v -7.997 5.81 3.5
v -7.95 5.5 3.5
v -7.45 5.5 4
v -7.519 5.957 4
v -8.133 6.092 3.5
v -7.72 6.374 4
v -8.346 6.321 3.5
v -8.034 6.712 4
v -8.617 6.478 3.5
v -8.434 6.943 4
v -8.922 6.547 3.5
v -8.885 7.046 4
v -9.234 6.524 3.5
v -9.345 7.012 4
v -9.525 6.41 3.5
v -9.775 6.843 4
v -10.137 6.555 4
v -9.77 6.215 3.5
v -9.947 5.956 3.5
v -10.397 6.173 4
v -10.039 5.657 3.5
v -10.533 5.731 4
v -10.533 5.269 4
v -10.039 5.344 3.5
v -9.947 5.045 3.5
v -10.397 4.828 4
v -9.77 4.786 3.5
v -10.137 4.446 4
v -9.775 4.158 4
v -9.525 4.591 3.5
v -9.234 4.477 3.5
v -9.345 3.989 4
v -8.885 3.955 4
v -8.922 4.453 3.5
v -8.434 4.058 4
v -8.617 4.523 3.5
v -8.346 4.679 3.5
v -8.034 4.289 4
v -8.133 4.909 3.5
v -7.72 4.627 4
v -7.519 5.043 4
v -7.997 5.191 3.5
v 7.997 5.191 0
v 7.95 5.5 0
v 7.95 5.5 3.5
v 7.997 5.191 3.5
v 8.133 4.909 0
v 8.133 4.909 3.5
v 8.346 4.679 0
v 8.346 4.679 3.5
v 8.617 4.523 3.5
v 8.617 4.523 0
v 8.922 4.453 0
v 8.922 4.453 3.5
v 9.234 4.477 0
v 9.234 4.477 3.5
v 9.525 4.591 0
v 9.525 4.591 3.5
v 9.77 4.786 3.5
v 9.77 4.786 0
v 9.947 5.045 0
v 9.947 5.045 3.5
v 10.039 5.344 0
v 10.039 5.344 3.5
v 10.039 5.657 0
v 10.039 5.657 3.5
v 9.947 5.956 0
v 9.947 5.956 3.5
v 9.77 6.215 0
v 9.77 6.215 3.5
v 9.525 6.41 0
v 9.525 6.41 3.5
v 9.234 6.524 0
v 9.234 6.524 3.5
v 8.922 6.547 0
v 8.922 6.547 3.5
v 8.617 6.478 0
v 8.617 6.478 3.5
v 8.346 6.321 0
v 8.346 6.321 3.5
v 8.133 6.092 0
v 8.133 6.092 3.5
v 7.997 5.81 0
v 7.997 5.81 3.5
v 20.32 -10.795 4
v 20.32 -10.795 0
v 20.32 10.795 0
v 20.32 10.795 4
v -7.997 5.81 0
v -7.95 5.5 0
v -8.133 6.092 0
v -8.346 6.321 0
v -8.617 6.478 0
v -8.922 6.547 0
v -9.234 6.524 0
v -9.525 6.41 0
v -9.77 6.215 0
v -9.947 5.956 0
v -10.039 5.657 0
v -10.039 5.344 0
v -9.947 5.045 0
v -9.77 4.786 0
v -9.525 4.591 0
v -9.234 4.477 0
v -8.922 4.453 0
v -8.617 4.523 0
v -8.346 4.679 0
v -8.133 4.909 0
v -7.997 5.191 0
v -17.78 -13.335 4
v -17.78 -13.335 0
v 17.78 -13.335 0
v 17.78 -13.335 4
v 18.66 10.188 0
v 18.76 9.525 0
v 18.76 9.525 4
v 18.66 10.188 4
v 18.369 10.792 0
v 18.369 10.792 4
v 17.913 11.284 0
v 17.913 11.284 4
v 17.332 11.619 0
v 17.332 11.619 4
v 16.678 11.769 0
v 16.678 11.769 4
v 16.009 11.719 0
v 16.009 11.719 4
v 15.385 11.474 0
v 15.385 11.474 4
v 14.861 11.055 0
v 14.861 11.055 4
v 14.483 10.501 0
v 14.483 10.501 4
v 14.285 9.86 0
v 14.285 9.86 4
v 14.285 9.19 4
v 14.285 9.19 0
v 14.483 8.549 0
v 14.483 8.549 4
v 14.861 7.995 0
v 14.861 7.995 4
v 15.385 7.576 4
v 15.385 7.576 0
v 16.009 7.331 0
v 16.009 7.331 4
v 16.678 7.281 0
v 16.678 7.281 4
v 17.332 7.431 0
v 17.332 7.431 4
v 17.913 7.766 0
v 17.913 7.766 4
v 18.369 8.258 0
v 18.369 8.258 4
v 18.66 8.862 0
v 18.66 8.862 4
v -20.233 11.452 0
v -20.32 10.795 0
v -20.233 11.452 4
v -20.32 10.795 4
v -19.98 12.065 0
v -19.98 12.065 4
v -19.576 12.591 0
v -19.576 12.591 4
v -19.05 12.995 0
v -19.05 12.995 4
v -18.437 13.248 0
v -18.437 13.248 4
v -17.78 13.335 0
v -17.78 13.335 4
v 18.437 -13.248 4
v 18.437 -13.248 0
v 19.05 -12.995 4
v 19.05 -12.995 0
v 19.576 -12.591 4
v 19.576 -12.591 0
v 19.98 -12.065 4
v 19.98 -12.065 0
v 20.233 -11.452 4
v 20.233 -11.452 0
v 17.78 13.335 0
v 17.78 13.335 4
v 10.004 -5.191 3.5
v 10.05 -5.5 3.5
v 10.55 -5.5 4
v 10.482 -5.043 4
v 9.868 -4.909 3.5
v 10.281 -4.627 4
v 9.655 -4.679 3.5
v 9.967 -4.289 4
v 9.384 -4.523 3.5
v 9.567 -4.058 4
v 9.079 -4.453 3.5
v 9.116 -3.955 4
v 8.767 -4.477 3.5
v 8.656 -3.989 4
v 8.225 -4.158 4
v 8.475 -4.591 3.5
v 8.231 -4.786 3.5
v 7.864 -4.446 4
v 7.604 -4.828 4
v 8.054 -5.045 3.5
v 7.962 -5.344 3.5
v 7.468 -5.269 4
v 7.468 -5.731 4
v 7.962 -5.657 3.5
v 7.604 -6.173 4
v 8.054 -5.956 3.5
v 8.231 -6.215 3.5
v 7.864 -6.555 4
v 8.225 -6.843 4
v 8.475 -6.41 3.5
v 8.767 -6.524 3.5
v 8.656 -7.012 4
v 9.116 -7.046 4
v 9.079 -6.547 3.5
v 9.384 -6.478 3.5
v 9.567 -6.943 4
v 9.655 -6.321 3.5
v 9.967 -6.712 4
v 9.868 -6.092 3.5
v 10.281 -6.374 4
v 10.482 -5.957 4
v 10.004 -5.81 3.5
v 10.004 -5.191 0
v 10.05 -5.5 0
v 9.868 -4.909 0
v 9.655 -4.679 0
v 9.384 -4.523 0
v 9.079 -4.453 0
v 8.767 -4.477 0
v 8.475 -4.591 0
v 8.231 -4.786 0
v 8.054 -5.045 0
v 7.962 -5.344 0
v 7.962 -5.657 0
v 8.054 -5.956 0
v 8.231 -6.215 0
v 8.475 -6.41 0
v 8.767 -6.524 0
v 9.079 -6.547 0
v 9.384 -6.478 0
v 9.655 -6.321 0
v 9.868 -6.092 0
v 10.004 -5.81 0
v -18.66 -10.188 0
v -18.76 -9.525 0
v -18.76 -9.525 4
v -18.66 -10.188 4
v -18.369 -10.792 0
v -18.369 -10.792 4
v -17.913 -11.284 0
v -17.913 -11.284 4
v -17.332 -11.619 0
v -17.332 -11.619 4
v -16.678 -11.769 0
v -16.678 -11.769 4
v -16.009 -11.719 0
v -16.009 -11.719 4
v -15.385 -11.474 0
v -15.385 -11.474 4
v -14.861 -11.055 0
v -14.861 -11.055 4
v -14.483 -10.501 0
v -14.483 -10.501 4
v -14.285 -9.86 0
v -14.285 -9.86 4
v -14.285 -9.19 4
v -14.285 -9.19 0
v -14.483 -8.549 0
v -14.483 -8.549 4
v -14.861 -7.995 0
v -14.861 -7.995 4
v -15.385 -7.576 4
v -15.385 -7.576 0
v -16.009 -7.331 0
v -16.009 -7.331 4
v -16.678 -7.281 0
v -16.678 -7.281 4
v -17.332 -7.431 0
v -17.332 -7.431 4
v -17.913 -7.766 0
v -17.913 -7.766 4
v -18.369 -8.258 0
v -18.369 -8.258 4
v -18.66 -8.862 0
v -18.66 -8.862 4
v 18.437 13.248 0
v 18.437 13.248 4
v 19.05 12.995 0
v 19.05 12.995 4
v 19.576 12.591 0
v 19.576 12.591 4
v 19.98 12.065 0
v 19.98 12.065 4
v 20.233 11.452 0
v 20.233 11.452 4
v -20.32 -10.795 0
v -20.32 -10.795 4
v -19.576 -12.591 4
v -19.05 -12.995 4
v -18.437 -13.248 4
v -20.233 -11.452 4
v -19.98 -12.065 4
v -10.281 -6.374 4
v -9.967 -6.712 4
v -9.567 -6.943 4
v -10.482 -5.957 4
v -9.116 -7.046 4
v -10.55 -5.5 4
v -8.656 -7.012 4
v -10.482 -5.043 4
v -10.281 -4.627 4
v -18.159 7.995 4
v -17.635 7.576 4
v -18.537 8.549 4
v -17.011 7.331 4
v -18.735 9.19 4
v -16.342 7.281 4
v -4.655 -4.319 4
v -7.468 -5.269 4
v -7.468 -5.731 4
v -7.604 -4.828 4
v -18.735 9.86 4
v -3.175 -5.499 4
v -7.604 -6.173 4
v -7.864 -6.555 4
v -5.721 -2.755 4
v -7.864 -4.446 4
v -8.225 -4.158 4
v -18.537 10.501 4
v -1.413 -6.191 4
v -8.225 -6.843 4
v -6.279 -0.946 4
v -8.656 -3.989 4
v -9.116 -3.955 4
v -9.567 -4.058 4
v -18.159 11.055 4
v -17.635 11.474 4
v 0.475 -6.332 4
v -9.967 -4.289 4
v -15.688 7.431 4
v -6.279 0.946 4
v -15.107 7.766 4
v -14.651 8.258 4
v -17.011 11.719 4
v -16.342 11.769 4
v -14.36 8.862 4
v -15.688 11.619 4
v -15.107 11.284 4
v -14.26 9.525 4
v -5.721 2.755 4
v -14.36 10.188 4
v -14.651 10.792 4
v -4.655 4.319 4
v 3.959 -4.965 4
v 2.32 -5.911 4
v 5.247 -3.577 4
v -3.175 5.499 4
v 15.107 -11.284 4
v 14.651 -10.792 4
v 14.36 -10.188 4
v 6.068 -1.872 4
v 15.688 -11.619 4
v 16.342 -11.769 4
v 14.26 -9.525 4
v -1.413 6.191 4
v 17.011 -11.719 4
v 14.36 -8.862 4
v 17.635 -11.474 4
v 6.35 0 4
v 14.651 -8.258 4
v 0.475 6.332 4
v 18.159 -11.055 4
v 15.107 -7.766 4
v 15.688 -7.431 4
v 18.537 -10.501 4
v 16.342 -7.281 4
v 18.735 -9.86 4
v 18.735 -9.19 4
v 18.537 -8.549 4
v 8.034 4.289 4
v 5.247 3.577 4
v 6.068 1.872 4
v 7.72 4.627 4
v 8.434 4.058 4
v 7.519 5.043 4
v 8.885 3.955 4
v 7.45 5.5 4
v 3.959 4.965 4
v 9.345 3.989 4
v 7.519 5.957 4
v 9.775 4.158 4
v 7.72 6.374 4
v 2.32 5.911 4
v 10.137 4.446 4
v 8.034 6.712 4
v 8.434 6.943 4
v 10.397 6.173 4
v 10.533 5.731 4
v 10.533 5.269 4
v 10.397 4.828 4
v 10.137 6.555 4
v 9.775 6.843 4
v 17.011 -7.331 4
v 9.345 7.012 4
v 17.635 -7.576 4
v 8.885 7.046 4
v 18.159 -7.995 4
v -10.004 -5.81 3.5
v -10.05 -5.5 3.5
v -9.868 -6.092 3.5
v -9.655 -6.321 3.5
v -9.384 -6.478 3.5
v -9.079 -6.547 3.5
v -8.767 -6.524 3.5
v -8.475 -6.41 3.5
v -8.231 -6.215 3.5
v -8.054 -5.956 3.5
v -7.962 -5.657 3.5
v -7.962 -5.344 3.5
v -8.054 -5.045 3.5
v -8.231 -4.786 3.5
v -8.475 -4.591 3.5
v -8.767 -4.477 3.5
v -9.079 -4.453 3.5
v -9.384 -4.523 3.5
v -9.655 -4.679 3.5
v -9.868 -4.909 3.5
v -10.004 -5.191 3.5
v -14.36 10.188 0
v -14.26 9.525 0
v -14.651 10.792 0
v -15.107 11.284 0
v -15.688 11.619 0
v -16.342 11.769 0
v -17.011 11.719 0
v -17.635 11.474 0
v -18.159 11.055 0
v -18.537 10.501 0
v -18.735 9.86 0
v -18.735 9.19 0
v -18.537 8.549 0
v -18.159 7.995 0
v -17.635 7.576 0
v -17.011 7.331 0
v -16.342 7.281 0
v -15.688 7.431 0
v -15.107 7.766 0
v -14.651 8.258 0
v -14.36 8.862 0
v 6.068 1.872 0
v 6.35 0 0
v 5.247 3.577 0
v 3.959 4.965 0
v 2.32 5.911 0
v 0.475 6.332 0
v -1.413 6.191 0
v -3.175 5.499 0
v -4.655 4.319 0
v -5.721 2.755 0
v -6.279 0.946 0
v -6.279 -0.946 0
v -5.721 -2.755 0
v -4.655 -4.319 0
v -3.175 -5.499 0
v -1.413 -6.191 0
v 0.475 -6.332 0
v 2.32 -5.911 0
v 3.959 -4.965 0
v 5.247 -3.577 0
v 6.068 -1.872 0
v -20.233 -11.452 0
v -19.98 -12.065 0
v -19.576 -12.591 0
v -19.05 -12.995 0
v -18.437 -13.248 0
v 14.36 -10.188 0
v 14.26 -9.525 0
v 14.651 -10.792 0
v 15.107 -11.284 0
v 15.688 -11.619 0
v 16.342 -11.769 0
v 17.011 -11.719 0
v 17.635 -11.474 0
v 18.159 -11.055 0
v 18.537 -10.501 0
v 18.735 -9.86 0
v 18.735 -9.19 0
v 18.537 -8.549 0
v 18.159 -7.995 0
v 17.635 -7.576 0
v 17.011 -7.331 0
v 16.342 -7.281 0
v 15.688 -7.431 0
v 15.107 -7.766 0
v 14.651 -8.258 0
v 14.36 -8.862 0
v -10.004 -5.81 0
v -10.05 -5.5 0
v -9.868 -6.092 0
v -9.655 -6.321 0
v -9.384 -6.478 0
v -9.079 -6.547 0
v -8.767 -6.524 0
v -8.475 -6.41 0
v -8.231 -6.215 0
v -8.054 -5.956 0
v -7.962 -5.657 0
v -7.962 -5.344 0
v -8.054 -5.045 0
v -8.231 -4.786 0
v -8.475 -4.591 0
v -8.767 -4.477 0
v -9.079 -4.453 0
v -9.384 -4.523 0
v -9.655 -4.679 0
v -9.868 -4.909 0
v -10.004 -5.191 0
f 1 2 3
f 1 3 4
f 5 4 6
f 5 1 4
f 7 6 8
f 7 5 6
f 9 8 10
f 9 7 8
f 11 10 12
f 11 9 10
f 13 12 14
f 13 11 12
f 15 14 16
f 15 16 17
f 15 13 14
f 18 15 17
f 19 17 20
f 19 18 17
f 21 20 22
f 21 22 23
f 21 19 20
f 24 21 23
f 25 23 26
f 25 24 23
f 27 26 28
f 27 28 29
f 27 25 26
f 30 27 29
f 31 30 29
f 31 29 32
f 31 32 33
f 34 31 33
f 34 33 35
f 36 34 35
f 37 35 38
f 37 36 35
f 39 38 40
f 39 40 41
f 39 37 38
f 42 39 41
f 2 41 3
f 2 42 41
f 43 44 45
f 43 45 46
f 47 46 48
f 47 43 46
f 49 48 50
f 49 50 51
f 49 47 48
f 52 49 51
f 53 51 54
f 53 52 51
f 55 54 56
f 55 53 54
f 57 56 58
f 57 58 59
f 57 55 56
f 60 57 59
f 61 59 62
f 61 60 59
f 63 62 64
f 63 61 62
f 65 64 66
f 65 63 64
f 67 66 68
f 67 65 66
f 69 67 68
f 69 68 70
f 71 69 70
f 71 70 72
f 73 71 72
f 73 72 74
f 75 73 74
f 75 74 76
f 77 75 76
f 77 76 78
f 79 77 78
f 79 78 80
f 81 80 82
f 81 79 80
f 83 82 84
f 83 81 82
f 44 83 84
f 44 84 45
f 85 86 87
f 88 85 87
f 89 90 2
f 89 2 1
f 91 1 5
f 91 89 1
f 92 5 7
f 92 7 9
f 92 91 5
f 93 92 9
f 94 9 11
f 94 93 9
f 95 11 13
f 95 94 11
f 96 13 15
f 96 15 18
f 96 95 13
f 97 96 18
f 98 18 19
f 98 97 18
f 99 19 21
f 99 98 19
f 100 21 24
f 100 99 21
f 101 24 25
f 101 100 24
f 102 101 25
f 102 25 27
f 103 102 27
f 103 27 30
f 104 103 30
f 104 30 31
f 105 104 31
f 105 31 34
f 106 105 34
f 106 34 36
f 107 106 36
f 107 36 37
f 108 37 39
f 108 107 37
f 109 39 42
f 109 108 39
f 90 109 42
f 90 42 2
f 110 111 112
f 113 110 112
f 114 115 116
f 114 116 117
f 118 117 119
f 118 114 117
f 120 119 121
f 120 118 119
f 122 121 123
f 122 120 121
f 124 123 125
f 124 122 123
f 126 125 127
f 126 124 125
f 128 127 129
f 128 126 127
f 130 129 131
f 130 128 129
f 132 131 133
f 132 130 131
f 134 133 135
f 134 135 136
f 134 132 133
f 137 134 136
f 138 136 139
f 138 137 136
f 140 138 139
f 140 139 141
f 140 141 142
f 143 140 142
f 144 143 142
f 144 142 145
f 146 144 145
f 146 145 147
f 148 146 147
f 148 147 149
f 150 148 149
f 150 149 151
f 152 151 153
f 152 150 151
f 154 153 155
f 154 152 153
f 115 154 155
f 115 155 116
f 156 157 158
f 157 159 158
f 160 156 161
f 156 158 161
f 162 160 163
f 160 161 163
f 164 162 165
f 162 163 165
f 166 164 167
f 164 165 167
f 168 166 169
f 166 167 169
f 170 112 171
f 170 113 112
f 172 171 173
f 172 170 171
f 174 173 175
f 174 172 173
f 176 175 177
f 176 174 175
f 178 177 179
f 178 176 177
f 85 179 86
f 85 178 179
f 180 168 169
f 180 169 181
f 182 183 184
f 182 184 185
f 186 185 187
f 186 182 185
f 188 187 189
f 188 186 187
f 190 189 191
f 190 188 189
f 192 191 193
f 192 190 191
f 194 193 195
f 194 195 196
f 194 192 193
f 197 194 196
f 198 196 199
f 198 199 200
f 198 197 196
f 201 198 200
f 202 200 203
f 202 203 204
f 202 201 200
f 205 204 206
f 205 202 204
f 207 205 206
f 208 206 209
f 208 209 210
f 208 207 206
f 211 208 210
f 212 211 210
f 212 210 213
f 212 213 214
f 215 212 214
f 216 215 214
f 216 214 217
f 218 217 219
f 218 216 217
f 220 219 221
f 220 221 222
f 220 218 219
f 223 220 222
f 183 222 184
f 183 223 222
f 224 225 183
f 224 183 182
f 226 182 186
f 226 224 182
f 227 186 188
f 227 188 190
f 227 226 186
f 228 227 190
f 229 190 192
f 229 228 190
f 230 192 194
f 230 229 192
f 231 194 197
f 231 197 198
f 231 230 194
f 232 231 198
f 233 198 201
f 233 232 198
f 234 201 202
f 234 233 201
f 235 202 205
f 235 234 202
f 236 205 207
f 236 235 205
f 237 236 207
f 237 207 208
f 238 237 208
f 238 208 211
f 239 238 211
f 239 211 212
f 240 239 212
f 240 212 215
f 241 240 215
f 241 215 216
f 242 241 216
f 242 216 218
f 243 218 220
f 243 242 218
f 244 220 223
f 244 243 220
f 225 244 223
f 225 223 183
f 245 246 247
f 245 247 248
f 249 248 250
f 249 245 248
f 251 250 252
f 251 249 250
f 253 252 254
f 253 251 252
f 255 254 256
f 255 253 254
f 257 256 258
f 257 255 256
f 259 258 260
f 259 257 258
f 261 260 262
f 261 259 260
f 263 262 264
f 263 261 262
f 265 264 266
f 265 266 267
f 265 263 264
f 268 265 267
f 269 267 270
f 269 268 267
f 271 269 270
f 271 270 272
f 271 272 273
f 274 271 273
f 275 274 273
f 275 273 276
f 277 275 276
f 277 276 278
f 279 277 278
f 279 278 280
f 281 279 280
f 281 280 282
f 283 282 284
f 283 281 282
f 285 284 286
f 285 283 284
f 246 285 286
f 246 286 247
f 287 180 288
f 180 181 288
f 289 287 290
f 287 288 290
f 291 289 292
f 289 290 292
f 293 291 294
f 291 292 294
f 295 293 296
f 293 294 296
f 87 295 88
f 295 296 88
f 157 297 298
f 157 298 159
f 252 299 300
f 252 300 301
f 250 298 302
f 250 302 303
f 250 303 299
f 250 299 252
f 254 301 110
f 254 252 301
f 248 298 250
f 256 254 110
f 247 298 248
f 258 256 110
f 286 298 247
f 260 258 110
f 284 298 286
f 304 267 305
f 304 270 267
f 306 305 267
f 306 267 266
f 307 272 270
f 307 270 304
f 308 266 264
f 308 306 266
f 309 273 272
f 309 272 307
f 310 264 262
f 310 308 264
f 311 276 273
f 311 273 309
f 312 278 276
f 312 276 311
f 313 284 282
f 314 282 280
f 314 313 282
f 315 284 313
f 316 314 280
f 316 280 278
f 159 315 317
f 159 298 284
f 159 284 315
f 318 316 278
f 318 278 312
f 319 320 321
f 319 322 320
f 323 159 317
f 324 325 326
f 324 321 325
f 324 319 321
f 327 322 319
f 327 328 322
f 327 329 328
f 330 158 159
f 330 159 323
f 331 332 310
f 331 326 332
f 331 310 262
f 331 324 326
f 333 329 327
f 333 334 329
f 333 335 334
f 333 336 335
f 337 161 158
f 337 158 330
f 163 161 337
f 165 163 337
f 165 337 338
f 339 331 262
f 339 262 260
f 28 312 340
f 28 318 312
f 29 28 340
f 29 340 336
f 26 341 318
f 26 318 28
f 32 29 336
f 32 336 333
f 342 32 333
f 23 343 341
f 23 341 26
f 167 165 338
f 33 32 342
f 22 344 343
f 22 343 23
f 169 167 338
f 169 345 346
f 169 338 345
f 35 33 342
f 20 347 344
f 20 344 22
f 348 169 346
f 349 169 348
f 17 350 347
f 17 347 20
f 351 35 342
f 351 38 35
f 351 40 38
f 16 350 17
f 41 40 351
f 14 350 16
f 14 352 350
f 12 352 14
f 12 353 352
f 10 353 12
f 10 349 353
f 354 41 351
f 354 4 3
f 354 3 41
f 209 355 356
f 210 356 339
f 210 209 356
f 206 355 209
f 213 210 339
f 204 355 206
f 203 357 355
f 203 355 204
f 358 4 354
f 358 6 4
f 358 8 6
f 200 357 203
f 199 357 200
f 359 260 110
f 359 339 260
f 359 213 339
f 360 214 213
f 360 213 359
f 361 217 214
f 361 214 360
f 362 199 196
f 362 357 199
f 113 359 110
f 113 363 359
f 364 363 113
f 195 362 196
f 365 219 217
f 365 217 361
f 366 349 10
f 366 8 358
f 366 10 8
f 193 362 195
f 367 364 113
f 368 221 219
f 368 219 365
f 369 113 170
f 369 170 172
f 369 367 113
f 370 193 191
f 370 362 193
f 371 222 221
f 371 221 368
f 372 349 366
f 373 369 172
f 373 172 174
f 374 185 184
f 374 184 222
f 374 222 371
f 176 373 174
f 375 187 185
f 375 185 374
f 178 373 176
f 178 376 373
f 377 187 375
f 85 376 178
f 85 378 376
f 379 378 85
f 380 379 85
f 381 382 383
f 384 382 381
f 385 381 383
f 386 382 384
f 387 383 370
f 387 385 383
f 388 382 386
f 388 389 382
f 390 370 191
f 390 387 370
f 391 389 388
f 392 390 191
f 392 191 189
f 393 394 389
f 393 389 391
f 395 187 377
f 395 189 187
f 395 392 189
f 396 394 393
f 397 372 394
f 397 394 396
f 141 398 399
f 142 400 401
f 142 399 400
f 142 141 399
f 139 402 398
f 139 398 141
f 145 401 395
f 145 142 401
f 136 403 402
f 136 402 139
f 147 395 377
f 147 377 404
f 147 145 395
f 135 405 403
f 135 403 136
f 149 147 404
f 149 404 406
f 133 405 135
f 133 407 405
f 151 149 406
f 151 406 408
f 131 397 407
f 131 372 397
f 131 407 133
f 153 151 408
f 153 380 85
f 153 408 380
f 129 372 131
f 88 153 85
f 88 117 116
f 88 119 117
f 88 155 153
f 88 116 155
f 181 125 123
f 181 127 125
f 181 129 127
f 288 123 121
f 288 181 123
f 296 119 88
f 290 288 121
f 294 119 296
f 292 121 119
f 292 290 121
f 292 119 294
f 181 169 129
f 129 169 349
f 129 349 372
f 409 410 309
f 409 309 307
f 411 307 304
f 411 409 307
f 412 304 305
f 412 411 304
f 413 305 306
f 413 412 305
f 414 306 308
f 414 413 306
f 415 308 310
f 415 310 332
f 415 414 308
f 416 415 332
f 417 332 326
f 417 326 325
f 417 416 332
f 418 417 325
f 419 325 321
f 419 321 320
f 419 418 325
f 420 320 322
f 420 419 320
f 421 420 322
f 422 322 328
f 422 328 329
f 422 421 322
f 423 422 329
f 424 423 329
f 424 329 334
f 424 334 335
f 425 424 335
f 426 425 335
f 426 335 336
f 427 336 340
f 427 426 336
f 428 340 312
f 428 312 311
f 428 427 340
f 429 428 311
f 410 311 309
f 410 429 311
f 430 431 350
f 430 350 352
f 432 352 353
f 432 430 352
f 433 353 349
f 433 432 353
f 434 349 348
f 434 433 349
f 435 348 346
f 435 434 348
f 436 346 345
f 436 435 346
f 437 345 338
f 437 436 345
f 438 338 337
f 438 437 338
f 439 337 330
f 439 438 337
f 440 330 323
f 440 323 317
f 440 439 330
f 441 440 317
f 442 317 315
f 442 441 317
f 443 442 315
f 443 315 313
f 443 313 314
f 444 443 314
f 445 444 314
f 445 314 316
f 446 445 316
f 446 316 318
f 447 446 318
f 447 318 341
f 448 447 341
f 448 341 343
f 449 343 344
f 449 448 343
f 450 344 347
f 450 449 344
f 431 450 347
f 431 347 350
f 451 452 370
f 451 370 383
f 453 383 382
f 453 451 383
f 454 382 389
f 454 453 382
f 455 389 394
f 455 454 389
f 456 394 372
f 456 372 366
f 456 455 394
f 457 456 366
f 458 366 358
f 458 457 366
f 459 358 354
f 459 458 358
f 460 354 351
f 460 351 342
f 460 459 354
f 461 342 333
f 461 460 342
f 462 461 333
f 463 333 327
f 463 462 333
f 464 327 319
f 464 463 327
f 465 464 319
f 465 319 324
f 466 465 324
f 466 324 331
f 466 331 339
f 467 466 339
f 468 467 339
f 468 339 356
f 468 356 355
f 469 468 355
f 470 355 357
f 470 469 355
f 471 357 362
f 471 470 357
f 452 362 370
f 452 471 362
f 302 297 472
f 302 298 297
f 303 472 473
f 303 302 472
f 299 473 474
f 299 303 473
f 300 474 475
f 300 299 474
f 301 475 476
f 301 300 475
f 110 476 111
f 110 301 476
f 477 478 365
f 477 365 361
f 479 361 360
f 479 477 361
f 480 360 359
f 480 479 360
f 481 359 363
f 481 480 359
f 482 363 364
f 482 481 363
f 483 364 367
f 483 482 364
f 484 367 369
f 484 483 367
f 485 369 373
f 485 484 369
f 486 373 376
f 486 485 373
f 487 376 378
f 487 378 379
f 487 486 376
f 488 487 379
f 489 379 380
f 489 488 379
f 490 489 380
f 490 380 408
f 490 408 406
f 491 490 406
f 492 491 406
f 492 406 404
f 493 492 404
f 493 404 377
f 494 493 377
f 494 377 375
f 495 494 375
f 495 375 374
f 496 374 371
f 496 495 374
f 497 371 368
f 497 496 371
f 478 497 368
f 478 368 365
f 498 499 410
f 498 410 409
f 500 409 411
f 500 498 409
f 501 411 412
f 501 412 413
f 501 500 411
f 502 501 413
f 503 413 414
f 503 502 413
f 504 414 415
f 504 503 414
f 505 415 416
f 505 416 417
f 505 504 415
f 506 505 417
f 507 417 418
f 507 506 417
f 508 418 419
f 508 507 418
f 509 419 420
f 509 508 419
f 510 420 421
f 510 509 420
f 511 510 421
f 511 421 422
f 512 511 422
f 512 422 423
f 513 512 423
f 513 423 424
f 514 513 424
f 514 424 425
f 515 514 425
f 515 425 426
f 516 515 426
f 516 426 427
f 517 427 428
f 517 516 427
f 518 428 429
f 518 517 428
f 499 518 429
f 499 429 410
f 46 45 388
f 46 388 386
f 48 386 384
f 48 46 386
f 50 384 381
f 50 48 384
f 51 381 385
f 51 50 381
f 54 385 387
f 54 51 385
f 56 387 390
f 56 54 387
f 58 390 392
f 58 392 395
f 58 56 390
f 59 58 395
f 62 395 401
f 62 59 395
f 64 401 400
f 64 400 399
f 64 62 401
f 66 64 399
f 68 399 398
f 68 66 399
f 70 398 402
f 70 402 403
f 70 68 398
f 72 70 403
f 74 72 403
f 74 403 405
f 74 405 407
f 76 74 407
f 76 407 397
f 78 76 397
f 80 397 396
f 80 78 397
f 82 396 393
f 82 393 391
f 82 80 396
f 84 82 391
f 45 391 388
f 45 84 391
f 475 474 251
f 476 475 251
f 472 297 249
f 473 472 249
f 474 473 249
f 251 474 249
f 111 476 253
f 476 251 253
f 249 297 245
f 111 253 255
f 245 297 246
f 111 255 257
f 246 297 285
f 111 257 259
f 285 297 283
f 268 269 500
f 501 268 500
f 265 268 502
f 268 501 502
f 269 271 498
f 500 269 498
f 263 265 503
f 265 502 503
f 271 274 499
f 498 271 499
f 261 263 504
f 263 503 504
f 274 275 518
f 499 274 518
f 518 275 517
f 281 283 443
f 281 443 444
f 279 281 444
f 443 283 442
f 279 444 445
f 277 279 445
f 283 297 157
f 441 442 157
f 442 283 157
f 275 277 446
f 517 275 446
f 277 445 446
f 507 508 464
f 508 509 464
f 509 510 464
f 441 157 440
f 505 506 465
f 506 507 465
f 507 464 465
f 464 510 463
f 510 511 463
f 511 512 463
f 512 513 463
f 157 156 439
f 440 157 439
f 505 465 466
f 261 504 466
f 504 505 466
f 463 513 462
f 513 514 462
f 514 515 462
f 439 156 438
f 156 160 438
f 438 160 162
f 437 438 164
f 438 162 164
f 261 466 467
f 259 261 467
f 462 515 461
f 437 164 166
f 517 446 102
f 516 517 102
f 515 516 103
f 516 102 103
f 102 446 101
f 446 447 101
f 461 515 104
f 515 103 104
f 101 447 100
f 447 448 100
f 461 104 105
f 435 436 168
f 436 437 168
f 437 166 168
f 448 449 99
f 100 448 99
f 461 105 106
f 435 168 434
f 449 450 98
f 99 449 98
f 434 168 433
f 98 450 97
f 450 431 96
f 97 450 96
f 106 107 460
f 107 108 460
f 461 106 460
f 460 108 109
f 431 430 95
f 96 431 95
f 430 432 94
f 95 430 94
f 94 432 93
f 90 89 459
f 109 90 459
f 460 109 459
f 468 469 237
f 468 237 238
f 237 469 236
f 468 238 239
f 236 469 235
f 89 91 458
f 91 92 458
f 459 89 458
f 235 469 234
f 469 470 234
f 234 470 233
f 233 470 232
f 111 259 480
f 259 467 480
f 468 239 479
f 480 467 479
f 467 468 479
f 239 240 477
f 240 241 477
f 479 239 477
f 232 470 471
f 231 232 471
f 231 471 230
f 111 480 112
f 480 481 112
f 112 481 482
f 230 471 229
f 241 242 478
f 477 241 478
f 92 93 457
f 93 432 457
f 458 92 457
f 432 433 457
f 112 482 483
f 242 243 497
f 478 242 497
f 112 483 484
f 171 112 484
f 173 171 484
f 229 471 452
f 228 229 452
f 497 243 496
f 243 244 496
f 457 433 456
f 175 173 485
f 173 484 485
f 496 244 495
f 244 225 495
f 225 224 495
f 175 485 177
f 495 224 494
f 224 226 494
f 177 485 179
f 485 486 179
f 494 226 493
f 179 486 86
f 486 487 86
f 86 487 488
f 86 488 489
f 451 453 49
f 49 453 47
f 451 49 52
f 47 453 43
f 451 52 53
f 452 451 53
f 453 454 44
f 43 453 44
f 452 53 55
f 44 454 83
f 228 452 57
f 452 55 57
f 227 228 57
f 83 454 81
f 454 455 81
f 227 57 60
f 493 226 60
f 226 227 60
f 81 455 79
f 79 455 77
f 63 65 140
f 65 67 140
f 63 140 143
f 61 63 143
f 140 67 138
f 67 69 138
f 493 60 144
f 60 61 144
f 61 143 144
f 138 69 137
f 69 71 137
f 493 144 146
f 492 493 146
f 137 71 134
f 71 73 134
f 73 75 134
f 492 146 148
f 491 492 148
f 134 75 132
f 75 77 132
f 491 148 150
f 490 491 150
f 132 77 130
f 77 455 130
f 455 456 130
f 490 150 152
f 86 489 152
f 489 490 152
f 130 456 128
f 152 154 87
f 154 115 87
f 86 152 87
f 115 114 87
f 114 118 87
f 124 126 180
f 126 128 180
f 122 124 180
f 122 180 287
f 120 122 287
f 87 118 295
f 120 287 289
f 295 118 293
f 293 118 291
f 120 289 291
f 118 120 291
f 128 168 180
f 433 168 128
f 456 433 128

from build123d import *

# Parameters (mm, degrees)
SKETCH1_W           = 40.64
SKETCH1_H           = 26.67
SKETCH1_R           = 2.25
SKETCH1_R_2         = 1.05
SKETCH1_R_3         = 6.35
BOSS_EXTRUDE1_DEPTH = 4
FILLET1_R           = 2.54
CHAMFER1_SIZE       = 0.5


with BuildPart() as part:
    # Sketch1 → Boss-Extrude1 (new body)
    with BuildSketch(Plane.XY):
        Rectangle(SKETCH1_W, SKETCH1_H)
        with Locations((-16.51, 9.525)):
            Circle(SKETCH1_R, mode=Mode.SUBTRACT)
        with Locations((16.51, 9.525)):
            Circle(SKETCH1_R, mode=Mode.SUBTRACT)
        with Locations(Location((16.51, -9.525, 0), (0, 0, 180))):
            Circle(SKETCH1_R, mode=Mode.SUBTRACT)
        with Locations(Location((-16.51, -9.525, 0), (0, 0, 180))):
            Circle(SKETCH1_R, mode=Mode.SUBTRACT)
        with Locations((-9.00049, 5.50037)):
            Circle(SKETCH1_R_2, mode=Mode.SUBTRACT)
        with Locations((9.00049, -5.50037)):
            Circle(SKETCH1_R_2, mode=Mode.SUBTRACT)
        Circle(SKETCH1_R_3, mode=Mode.SUBTRACT)
        with Locations(Location((-9.00049, -5.50037, 0), (0, 0, 180))):
            Circle(SKETCH1_R_2, mode=Mode.SUBTRACT)
        with Locations(Location((9.00049, 5.50037, 0), (0, 0, 180))):
            Circle(SKETCH1_R_2, mode=Mode.SUBTRACT)
    extrude(amount=BOSS_EXTRUDE1_DEPTH)

    # Fillet1
    fillet1_edges = [part.edges().sort_by_distance(p)[0] for p in [
        (-20.32, 13.335, 2),
        (20.32, 13.335, 2),
        (20.32, -13.335, 2),
        (-20.32, -13.335, 2),
    ]]
    fillet(fillet1_edges, radius=FILLET1_R)

    # Chamfer1
    chamfer1_edges = [part.edges().sort_by_distance(p)[0] for p in [
        (7.95049, -5.50037, 4),
        (-10.05049, 5.50037, 4),
        (-7.95049, -5.50037, 4),
        (10.05049, 5.50037, 4),
    ]]
    chamfer(chamfer1_edges, length=CHAMFER1_SIZE)


solid = part.part
